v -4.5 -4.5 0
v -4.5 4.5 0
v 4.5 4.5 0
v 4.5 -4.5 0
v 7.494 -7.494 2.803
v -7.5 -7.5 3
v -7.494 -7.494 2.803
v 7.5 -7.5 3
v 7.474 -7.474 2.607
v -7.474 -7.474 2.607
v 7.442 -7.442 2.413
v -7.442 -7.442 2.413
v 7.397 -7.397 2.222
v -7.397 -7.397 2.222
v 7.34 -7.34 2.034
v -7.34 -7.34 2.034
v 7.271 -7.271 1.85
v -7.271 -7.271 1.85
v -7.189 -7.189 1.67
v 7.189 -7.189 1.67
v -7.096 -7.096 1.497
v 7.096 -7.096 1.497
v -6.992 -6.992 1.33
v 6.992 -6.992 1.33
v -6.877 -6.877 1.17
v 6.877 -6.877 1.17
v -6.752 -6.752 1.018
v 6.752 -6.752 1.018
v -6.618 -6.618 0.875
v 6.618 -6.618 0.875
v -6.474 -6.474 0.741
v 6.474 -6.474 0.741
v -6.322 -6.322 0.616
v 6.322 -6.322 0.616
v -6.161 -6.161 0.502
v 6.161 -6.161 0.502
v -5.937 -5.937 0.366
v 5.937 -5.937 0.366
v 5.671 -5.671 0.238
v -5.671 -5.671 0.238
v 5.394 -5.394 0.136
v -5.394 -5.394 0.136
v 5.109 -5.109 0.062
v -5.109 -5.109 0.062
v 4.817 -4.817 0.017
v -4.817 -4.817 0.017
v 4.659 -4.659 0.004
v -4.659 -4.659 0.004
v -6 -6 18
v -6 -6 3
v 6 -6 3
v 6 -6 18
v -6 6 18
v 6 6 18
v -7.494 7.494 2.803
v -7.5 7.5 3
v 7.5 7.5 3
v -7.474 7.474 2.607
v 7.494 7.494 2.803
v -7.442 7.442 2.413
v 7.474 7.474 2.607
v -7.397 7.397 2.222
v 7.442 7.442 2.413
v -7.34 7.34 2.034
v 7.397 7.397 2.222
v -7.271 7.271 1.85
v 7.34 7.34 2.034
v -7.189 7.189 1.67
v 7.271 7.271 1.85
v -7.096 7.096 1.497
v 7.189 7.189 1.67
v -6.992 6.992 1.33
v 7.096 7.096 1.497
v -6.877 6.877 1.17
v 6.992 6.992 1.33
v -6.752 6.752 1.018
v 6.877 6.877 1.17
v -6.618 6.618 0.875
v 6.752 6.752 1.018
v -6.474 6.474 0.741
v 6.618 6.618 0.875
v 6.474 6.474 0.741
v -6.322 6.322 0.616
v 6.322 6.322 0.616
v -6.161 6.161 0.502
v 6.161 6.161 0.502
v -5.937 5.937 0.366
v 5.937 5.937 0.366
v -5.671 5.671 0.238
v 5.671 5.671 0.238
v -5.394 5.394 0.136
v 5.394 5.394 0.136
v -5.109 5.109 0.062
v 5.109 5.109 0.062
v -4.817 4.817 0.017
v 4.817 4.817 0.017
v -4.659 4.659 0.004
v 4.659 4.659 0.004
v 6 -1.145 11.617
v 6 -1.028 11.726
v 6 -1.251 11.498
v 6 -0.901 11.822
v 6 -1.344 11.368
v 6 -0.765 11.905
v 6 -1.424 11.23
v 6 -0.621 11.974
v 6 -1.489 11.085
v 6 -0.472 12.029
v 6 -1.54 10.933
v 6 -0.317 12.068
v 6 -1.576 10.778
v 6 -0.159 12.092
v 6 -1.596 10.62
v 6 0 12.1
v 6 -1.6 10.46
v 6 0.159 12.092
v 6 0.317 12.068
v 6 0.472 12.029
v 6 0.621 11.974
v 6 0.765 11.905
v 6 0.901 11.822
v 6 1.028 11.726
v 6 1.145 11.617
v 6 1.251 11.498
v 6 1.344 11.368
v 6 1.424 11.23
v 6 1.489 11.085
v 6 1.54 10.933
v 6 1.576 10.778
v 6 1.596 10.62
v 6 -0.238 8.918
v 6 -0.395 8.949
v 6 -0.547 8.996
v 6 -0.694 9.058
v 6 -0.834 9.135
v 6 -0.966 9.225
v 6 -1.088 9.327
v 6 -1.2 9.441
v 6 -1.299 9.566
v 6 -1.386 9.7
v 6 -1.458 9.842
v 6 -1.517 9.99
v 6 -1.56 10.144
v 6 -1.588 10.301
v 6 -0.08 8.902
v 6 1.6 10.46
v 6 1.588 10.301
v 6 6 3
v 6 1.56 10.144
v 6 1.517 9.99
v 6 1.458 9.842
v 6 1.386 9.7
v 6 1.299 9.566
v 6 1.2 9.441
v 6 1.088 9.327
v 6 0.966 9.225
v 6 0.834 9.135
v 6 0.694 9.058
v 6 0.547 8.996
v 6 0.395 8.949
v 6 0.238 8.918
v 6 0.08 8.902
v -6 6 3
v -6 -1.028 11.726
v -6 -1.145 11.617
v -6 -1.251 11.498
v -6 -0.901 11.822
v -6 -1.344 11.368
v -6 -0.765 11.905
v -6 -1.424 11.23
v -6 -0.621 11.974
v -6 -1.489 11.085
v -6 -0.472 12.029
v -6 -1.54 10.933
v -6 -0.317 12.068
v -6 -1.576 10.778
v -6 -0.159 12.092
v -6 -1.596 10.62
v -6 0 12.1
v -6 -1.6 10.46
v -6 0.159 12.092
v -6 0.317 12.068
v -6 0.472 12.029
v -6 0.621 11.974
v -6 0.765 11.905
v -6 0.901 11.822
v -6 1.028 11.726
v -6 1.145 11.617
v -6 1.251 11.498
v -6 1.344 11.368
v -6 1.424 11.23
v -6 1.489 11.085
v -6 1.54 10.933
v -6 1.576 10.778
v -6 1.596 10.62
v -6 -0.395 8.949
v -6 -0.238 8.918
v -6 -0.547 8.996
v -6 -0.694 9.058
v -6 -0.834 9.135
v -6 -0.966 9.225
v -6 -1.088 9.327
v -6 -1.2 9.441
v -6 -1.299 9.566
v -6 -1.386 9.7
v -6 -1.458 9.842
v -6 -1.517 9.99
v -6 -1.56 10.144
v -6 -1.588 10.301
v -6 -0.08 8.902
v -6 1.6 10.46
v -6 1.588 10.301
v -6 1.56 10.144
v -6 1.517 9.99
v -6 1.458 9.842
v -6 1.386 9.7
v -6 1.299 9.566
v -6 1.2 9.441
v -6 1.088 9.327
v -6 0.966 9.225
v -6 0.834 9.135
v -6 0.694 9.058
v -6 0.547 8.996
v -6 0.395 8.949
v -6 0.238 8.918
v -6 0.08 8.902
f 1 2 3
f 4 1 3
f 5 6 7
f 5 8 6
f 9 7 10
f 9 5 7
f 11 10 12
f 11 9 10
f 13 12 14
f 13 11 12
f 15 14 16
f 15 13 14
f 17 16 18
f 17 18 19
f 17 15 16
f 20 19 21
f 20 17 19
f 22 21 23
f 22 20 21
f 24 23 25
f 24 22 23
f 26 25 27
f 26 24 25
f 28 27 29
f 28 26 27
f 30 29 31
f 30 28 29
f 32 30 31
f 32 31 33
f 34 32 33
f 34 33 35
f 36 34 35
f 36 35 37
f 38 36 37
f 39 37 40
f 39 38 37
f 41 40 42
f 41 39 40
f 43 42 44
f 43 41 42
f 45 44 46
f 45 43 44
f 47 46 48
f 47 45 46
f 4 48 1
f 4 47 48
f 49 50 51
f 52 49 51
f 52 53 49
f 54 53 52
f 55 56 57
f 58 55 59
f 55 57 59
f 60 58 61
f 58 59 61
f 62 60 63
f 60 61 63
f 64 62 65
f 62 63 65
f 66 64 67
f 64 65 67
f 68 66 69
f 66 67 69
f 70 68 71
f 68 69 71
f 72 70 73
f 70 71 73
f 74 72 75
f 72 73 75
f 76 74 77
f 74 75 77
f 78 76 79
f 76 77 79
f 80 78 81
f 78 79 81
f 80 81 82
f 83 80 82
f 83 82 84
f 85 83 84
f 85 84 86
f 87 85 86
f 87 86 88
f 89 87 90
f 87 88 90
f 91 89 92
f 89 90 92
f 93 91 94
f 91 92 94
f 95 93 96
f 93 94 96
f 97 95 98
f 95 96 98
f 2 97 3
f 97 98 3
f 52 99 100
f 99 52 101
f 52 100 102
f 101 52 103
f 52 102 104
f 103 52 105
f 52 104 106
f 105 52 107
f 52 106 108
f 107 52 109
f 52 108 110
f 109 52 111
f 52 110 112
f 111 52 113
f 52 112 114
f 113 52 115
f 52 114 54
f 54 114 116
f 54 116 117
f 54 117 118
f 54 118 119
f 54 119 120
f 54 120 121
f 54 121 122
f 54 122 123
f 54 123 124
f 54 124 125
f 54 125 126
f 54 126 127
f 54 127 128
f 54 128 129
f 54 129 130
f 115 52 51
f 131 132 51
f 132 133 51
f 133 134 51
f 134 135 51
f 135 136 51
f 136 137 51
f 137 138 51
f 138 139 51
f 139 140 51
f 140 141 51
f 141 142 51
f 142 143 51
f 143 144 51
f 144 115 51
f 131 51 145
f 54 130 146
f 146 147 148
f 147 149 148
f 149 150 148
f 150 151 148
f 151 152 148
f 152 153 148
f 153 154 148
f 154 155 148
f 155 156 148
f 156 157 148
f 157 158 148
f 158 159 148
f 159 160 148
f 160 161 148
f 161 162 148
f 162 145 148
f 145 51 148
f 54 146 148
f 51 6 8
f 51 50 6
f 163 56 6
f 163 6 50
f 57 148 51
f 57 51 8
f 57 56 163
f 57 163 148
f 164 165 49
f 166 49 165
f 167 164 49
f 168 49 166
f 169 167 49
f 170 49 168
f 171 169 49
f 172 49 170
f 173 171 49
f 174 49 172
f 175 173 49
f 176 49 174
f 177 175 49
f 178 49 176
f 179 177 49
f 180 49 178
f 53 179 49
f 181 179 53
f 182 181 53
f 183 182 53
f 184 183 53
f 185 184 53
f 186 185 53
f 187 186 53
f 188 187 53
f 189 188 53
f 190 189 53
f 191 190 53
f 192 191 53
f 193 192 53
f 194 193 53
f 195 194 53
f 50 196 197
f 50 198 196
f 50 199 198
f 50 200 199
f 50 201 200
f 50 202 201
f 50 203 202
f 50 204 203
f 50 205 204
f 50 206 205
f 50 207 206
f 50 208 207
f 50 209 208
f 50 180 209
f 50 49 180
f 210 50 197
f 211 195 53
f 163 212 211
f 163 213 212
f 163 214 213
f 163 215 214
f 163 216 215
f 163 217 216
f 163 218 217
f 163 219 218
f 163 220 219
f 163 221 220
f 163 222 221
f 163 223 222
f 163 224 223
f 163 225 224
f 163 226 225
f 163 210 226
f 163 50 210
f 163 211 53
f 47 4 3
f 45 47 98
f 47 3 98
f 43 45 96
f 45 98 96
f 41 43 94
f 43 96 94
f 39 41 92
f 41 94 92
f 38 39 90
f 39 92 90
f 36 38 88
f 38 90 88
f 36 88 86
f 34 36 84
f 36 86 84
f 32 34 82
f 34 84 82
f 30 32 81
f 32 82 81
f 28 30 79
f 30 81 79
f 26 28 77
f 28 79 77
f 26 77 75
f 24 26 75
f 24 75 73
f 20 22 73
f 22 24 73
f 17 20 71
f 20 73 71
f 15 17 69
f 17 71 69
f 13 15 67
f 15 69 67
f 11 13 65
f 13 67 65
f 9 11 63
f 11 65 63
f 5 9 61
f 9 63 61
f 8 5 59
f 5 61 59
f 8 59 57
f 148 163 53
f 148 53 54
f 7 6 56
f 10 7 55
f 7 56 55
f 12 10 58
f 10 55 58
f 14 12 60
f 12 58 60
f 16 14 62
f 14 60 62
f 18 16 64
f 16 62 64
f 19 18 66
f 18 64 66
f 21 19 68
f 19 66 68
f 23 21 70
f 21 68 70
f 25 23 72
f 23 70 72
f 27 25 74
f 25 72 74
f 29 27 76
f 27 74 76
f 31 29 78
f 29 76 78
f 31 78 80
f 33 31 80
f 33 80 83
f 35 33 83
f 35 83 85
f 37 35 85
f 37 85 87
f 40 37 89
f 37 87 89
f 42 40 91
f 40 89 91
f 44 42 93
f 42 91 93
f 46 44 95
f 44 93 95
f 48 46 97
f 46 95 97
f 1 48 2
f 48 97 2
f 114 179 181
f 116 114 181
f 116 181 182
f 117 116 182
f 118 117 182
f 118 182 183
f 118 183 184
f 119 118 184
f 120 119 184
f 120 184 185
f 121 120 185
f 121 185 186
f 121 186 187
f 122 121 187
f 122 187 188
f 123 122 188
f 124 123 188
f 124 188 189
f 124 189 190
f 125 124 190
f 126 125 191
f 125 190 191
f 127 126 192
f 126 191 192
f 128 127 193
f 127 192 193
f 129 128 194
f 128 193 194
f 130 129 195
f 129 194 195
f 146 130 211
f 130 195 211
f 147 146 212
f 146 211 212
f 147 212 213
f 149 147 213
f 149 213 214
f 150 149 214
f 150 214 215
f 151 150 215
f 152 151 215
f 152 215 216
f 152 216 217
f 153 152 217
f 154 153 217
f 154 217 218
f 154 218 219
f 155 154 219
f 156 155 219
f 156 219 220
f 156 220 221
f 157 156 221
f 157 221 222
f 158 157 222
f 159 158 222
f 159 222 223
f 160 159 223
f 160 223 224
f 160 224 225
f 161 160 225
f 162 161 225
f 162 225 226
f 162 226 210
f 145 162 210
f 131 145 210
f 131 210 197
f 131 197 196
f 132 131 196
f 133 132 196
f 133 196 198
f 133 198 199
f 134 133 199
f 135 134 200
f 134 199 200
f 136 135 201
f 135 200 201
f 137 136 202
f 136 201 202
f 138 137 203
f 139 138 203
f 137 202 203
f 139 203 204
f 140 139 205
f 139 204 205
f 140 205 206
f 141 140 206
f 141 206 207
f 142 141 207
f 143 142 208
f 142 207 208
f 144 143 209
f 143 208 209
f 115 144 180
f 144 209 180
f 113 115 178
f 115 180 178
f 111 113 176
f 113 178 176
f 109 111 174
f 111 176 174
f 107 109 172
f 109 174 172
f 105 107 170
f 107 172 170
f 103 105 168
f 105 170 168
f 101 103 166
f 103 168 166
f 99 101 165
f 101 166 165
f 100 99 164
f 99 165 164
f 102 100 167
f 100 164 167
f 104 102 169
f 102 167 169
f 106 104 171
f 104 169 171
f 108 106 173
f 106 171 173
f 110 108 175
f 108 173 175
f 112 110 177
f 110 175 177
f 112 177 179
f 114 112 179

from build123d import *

# Parameters (mm, degrees)
SKETCH_8_W          = 15
SKETCH_8_H          = 15
EXTRUDE_3_DEPTH     = 3
SKETCH_9_W          = 12
SKETCH_9_H          = 12
EXTRUDE_4_DEPTH     = 15
SKETCH_10_R         = 1.6
CUT_EXTRUDE_2_DEPTH = 24.717082451
FILLET_2_R          = 3


with BuildPart() as part:
    # ｽｹｯﾁ8 → ﾎﾞｽ - 押し出し3 (new body)
    with BuildSketch(Plane.XY):
        Rectangle(SKETCH_8_W, SKETCH_8_H)
    extrude(amount=EXTRUDE_3_DEPTH)

    # ｽｹｯﾁ9 → ﾎﾞｽ - 押し出し4 (add)
    with BuildSketch(Plane.XY.offset(3)):
        Rectangle(SKETCH_9_W, SKETCH_9_H)
    extrude(amount=EXTRUDE_4_DEPTH)

    # ｽｹｯﾁ10 → ｶｯﾄ - 押し出し2 (cut, through all)
    with BuildSketch(Plane.ZY.offset(6)):
        with Locations((10.5, 0)):
            Circle(SKETCH_10_R)
    extrude(amount=-CUT_EXTRUDE_2_DEPTH, mode=Mode.SUBTRACT)

    # ﾌｨﾚｯﾄ2
    fillet_2_edges = [part.edges().sort_by_distance(p)[0] for p in [
        (0, 7.5, 0),
        (-7.5, 0, 0),
        (0, -7.5, 0),
        (7.5, 0, 0),
    ]]
    fillet(fillet_2_edges, radius=FILLET_2_R - 0.0001)  # a hair under: the kernel refuses the full size


solid = part.part
